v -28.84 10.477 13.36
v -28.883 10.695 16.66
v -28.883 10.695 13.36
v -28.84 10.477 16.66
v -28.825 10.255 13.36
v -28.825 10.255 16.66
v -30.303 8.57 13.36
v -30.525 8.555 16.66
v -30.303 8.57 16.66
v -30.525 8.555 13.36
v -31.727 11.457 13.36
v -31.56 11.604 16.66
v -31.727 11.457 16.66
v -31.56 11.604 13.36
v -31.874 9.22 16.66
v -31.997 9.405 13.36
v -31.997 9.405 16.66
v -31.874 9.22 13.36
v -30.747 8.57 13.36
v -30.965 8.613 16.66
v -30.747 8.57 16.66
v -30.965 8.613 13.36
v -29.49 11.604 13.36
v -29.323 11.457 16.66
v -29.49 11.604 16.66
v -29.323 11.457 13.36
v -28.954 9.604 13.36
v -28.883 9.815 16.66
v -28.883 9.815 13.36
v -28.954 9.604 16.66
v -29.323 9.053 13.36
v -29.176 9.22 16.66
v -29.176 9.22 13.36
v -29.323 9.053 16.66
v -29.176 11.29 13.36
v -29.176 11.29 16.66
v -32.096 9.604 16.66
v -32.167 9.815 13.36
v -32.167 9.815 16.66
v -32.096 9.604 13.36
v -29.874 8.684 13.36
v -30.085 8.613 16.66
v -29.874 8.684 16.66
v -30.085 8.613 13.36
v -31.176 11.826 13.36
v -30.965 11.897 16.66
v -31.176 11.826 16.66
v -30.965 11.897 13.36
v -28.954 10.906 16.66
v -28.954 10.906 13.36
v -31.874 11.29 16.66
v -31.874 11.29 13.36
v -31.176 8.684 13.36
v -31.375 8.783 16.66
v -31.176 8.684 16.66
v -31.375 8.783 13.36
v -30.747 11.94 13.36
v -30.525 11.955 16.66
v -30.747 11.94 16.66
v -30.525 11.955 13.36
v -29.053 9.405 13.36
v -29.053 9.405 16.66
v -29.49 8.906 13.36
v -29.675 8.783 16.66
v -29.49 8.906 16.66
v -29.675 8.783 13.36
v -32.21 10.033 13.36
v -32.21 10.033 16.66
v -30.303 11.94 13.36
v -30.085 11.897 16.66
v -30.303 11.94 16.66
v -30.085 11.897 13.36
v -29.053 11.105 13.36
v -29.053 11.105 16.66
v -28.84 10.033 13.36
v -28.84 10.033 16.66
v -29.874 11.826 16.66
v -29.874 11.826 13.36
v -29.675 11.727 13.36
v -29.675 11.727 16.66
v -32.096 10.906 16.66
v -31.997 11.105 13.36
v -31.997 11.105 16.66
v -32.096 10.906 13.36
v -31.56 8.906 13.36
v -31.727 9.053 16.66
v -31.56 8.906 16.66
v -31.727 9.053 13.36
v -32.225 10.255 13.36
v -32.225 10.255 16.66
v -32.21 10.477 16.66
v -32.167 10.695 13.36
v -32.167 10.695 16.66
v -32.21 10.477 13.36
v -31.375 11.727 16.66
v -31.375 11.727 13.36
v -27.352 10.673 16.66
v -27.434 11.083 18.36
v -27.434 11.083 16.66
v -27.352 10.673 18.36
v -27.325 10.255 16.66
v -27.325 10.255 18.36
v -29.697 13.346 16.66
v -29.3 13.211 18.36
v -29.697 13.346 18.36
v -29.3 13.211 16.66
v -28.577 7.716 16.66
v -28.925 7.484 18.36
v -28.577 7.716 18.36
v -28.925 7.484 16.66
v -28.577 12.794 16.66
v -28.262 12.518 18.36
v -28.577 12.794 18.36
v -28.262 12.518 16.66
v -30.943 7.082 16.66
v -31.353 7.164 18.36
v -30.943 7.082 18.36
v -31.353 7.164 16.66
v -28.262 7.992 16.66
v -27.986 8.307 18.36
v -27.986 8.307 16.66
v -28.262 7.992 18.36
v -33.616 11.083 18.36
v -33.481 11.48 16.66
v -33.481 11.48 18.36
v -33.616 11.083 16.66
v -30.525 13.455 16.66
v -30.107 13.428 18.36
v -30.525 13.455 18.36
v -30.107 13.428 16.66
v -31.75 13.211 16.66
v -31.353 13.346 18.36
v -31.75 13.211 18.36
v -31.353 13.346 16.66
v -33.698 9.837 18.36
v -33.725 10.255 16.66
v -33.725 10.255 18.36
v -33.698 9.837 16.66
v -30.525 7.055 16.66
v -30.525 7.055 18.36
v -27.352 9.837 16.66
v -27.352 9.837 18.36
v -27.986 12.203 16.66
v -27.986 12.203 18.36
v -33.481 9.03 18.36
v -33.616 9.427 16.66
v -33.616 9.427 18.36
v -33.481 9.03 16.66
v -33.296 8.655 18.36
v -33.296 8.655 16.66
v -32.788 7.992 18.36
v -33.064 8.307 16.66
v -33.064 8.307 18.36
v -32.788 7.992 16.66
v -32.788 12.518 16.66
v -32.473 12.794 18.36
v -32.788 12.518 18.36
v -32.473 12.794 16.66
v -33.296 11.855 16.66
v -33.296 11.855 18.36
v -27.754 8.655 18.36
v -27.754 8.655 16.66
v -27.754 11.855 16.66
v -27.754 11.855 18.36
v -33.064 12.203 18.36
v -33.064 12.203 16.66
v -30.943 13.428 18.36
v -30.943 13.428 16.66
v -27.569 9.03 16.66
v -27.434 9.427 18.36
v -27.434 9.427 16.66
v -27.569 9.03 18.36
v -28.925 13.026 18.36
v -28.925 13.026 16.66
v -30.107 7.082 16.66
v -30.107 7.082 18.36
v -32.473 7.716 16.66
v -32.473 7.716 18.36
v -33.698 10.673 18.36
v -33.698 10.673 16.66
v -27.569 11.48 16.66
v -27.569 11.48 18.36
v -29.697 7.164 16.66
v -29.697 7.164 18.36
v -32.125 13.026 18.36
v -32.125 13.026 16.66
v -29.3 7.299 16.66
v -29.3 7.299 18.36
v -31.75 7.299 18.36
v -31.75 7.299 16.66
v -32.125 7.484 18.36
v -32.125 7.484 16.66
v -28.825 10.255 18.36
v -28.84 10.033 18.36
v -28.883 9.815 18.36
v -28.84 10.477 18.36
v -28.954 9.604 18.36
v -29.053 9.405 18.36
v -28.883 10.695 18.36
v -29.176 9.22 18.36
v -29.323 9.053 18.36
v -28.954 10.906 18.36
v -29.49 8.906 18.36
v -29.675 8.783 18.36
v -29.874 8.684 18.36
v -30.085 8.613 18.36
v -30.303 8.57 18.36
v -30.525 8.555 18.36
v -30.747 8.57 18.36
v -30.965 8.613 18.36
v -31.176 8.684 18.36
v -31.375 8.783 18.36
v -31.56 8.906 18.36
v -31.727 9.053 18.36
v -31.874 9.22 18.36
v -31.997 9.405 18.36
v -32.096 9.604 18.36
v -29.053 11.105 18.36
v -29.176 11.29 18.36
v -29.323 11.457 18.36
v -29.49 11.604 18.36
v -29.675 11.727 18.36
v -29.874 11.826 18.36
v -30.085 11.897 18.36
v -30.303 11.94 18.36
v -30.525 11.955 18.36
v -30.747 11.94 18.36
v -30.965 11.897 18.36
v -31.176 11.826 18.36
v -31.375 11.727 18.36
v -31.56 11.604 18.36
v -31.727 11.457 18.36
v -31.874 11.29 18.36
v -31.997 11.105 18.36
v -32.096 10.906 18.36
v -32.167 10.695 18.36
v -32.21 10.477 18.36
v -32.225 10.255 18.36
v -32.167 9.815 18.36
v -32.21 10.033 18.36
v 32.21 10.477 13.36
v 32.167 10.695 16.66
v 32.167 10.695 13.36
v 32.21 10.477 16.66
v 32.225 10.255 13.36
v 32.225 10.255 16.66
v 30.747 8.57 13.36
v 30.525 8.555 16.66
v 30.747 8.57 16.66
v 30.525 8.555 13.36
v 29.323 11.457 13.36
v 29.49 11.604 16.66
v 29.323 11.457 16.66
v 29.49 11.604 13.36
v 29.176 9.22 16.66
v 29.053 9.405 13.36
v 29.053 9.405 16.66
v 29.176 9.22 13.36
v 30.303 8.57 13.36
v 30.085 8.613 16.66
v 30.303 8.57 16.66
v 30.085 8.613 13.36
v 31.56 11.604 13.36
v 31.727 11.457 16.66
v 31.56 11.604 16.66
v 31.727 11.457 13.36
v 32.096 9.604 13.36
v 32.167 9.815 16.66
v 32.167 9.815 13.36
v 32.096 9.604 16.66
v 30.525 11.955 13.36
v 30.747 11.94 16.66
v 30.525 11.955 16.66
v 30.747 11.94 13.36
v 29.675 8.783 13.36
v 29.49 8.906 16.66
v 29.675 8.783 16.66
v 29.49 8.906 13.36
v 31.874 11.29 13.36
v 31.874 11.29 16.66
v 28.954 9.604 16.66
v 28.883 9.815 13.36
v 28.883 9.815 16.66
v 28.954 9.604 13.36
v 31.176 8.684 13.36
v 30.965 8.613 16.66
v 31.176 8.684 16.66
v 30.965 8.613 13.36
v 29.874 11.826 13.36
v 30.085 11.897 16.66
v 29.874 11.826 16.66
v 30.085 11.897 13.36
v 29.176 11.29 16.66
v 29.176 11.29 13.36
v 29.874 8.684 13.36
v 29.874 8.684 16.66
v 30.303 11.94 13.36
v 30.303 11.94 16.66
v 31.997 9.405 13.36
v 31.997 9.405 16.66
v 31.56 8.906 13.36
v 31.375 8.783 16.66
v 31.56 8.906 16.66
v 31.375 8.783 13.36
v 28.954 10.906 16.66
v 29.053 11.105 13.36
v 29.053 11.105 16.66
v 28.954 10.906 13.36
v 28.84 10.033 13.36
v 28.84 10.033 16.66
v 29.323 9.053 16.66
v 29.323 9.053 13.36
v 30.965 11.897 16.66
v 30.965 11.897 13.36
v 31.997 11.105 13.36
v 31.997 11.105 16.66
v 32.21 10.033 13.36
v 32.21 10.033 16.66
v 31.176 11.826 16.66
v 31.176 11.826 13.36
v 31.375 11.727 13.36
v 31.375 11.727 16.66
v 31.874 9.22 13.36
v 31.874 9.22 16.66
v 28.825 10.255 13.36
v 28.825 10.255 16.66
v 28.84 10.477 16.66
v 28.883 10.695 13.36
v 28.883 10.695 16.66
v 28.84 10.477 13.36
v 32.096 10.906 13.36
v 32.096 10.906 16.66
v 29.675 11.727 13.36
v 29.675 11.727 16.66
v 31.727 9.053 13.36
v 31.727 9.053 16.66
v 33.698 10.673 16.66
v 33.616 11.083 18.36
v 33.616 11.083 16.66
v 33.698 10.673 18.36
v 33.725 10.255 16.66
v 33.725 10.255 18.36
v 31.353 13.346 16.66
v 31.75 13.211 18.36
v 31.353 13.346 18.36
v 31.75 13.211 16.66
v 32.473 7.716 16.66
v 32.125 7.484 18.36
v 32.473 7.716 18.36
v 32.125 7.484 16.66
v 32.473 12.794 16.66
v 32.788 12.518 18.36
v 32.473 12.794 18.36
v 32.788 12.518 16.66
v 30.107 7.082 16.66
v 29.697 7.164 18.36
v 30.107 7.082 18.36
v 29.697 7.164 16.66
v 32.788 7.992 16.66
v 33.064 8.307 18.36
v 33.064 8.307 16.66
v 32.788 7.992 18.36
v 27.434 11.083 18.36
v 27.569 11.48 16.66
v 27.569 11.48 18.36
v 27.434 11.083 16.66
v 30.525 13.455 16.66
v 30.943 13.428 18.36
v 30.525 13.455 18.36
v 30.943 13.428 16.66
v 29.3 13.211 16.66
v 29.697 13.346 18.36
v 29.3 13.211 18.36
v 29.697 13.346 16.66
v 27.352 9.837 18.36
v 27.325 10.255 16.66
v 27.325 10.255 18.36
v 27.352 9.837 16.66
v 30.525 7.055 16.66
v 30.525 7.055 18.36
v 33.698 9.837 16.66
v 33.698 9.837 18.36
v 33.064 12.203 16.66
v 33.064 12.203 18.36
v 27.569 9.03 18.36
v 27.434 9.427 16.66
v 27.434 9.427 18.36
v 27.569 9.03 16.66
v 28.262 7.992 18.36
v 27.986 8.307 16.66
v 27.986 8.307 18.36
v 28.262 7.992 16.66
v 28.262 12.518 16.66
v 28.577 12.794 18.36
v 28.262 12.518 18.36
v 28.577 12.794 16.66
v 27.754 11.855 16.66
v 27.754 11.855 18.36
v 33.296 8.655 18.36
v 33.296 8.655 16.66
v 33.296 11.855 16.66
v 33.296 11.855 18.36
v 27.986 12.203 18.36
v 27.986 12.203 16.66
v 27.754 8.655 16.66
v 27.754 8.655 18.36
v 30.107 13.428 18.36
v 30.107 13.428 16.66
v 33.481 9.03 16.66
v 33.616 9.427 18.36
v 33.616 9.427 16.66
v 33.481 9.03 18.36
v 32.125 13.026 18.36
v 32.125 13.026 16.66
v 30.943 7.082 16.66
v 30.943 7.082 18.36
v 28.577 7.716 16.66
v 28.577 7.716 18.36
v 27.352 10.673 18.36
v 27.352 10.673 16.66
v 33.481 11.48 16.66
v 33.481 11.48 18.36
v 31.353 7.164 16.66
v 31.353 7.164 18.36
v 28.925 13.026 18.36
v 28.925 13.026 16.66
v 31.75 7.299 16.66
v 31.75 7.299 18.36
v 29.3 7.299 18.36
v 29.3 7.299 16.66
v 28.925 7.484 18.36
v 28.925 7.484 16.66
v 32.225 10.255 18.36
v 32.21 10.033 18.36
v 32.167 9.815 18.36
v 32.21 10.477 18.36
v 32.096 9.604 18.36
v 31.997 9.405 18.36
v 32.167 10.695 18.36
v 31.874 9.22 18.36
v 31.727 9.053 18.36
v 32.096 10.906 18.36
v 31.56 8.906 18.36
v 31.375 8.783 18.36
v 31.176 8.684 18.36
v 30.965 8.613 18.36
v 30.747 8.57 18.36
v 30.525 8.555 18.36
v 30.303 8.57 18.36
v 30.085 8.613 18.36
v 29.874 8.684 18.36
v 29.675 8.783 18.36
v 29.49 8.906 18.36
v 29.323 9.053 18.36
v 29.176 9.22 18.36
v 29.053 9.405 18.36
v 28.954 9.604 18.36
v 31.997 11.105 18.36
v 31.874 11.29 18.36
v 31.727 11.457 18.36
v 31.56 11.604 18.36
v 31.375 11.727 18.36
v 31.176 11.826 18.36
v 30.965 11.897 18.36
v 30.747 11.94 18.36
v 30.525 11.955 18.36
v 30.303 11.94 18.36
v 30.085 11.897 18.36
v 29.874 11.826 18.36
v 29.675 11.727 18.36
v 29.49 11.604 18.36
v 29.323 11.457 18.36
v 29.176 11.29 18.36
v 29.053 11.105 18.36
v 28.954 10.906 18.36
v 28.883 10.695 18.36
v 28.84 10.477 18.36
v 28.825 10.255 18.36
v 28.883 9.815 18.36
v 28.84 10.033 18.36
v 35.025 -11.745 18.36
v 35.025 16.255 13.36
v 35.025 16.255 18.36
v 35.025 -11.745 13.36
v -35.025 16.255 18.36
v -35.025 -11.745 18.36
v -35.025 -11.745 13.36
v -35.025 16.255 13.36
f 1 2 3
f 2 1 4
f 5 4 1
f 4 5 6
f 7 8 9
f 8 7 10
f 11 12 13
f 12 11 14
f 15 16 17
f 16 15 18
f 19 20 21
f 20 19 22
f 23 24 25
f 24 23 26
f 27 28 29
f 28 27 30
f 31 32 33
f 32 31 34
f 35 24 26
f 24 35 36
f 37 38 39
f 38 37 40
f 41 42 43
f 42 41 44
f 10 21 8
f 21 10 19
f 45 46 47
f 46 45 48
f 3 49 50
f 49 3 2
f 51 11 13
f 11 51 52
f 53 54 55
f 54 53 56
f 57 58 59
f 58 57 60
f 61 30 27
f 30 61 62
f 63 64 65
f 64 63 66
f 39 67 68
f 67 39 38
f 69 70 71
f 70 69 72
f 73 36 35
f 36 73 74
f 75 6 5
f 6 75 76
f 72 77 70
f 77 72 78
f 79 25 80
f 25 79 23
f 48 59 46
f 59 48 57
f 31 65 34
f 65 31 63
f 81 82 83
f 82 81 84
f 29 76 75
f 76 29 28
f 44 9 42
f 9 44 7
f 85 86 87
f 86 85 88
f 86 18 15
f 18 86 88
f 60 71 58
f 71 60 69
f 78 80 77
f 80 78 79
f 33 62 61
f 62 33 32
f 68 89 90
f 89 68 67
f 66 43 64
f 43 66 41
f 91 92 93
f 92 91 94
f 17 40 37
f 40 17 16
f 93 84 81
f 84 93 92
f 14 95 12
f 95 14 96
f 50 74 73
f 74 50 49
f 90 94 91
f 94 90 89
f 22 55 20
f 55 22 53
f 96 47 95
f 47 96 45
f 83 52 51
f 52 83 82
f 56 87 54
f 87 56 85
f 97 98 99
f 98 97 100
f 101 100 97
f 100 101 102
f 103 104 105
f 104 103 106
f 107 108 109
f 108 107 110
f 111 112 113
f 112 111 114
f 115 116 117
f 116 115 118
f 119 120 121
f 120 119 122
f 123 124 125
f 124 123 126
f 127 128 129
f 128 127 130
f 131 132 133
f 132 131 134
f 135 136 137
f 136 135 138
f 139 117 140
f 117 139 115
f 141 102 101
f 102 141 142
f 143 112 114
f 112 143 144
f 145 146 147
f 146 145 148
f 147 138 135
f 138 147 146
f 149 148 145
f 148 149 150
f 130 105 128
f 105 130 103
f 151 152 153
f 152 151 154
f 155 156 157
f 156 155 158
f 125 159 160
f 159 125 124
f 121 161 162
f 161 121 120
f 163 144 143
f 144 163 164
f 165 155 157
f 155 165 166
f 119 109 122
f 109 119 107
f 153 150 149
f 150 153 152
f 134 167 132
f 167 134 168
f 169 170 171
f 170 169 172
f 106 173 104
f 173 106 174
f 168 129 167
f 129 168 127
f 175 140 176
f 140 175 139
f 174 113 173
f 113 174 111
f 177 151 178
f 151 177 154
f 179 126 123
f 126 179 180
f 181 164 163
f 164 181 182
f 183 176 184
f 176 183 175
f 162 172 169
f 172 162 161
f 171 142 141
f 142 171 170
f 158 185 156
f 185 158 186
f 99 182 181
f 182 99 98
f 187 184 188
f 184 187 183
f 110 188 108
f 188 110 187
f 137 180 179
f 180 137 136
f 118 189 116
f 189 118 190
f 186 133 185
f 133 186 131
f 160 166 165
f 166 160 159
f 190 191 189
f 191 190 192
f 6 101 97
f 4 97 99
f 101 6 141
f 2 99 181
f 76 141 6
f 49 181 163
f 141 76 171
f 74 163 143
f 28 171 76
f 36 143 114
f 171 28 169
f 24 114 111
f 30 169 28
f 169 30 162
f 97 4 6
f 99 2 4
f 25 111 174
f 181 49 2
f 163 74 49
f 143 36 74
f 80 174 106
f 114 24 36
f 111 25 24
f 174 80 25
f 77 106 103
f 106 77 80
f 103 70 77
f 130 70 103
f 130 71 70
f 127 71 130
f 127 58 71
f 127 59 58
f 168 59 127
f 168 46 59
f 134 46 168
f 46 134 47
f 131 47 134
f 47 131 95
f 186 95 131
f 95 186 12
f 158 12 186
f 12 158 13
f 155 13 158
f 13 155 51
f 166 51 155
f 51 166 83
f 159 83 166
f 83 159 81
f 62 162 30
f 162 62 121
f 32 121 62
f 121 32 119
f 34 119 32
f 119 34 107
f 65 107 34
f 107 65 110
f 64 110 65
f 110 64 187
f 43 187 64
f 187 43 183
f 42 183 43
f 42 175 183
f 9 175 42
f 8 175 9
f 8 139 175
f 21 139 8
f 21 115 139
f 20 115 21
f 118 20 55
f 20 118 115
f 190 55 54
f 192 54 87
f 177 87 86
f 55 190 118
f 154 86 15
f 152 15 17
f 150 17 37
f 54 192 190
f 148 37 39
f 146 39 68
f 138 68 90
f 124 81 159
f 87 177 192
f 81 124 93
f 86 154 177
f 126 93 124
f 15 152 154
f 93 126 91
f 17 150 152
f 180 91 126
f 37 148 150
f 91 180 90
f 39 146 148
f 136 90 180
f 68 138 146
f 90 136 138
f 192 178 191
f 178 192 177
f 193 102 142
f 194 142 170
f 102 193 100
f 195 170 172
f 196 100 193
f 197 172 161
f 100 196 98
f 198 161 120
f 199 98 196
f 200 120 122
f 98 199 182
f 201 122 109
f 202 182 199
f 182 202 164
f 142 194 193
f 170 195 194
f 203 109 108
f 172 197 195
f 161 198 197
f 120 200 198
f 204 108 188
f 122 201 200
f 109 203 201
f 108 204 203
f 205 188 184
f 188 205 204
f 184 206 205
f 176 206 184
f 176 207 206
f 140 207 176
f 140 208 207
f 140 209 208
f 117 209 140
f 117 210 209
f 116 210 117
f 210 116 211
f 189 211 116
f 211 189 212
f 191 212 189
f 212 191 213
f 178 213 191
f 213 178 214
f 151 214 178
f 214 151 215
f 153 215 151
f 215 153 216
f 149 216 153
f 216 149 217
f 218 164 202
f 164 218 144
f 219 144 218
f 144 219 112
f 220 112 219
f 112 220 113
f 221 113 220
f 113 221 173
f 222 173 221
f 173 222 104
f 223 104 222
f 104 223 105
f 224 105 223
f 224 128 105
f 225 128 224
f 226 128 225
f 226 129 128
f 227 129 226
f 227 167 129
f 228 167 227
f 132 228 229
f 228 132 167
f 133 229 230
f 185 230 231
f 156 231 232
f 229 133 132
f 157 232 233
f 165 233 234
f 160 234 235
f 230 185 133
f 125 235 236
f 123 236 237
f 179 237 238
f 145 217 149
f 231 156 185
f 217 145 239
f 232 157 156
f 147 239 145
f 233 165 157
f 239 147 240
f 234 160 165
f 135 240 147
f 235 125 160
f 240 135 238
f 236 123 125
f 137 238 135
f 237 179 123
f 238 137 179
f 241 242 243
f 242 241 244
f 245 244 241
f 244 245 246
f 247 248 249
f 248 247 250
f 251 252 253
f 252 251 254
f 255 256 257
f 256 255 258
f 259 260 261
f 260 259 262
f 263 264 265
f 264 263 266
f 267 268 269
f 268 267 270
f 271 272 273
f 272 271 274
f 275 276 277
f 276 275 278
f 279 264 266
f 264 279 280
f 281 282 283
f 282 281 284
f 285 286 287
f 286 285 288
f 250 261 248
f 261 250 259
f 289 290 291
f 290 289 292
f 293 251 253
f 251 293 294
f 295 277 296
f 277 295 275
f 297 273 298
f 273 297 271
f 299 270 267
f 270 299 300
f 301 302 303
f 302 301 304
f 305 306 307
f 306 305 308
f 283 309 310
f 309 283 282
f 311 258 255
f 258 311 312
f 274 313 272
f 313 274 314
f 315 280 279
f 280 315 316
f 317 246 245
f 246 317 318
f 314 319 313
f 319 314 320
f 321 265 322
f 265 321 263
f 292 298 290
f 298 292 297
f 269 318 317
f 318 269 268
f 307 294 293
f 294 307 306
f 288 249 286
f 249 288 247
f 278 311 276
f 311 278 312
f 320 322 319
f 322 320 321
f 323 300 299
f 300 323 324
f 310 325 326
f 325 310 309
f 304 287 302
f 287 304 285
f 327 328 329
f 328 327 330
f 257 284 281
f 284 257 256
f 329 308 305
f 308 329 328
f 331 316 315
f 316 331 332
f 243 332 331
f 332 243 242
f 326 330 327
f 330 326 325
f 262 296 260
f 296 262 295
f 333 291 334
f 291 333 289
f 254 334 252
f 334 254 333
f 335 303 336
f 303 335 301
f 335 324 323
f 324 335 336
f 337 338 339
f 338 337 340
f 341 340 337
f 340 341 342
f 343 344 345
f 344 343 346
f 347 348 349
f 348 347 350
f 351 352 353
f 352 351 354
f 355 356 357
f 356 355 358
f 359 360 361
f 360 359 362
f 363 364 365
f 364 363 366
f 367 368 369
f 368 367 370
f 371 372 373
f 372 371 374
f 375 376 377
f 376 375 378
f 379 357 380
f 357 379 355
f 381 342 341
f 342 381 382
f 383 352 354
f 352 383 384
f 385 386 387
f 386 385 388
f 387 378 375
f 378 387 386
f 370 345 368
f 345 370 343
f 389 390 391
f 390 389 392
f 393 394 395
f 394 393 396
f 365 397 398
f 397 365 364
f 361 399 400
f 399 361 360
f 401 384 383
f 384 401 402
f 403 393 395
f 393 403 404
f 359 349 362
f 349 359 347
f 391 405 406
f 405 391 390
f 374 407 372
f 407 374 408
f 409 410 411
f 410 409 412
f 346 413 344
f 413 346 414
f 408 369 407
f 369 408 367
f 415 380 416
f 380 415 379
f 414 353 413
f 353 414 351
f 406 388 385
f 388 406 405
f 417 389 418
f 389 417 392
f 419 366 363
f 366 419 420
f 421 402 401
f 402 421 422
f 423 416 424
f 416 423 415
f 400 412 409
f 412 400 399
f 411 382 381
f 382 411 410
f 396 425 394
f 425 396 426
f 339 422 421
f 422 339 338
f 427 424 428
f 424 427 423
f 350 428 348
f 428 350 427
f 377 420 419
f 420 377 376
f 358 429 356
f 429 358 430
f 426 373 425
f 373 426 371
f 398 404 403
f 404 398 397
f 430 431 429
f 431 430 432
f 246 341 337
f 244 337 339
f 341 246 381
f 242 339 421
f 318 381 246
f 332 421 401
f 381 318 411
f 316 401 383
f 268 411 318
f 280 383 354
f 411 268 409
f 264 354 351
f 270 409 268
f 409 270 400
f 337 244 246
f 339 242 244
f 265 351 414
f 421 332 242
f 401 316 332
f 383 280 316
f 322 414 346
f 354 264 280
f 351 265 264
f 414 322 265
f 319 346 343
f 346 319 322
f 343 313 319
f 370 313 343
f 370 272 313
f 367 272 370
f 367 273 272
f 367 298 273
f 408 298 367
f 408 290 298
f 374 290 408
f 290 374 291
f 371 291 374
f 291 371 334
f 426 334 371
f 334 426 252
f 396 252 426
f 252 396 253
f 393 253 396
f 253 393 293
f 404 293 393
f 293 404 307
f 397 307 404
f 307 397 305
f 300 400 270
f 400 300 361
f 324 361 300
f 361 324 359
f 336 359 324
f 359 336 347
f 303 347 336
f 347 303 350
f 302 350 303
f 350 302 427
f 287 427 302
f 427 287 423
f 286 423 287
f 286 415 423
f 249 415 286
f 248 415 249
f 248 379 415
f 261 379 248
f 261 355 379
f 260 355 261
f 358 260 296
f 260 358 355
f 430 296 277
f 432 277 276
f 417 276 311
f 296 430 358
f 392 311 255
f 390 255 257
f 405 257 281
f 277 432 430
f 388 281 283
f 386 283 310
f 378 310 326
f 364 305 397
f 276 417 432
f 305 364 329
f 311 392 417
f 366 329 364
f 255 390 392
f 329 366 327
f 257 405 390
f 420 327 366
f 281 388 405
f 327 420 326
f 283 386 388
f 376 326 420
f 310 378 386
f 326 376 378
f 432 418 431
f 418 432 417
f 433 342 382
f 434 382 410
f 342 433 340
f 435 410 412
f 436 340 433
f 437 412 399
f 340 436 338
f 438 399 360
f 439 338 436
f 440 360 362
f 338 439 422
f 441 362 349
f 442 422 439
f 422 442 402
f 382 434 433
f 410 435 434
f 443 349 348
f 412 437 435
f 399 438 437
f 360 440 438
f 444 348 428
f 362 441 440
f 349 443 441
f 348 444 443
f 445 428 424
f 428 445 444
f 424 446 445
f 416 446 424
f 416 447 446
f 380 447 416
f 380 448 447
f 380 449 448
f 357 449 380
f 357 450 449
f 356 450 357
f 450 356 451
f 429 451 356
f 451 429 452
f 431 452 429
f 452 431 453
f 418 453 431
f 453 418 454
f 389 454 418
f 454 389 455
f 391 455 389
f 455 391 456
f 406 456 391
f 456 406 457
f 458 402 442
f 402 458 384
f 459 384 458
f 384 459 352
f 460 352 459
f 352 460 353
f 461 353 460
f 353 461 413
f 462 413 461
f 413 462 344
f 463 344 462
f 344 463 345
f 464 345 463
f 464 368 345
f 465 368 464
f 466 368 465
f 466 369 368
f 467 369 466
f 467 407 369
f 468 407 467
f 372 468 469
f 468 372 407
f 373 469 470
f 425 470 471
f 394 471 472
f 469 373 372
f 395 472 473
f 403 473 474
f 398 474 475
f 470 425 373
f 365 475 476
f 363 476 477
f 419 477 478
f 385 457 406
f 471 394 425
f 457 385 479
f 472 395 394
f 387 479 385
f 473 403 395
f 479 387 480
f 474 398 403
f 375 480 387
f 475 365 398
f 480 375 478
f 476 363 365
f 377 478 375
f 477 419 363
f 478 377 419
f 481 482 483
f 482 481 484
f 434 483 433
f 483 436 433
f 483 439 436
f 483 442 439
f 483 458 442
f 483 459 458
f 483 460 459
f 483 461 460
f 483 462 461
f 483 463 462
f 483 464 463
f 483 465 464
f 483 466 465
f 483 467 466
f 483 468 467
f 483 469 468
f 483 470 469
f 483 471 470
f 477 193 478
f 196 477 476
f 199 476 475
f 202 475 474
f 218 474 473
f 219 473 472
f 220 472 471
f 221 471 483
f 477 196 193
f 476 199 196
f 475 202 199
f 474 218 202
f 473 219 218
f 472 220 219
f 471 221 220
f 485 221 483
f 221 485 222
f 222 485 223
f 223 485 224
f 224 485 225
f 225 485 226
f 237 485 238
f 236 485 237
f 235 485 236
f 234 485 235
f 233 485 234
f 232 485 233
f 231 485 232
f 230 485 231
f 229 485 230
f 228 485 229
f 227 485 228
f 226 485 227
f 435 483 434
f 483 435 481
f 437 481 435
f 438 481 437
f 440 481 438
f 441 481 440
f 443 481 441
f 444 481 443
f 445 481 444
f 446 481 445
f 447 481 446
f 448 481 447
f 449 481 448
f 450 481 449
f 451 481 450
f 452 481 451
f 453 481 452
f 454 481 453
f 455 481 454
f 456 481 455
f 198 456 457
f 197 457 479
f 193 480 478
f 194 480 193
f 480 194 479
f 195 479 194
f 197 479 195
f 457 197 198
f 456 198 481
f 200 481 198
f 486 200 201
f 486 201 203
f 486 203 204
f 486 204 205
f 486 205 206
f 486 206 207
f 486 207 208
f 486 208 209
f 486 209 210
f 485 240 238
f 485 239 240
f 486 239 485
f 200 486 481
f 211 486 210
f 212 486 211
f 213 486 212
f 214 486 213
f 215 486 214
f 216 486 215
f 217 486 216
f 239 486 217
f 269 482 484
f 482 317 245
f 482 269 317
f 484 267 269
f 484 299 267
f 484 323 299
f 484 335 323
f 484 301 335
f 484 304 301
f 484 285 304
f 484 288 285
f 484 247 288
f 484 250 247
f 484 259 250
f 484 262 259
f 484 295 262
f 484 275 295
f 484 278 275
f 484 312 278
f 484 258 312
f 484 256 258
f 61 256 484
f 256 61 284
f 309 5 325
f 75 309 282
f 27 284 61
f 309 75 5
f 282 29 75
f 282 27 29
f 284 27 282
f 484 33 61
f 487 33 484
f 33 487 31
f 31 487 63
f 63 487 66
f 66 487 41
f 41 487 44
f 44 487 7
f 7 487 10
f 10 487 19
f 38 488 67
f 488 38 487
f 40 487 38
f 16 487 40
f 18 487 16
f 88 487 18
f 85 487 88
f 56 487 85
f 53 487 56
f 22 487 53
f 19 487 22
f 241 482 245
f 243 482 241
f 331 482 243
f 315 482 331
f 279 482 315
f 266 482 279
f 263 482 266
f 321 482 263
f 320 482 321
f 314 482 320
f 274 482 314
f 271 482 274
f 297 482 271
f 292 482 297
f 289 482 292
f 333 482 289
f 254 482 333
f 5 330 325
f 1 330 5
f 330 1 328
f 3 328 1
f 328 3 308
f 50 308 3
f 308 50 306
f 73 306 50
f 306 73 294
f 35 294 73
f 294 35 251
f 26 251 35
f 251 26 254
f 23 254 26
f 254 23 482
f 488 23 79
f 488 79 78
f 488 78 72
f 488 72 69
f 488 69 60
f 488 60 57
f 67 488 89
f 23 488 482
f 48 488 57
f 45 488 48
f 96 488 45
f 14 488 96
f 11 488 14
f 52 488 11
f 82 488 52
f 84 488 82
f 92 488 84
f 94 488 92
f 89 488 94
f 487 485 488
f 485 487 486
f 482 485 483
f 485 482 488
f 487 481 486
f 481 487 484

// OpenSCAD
// file: thermal_cam_mount_common.scad
// thermal_cam_mount_common.scad — sandwich clamp holding a Sipeed T256s thermal
// camera on the LED-56S ring light's control-box tab, for the benchhud HUD.
//
// WHY: the T256s is registered onto the scope's visible feed so a hot component's
// bloom labels that component. The registration transform is computed once and
// must HOLD every session → rigid, non-drifting, fixed-angle mount.
//
// TAB (control box, measured 2026-07-23): 49.65 W (X) × 32.51 front-to-back (Y)
// × 26.42 thick (Z). The tab is a BOSS on top of the ring, so five of its faces
// are unusable: REAR merges into the ring, FRONT has the brightness wheel, the
// two SIDES have the switch and the jack, and the BOTTOM has a center screw.
// Only the TOP (scope-facing) face is fully clear.
//
// SANDWICH: a TOP plate and a BOTTOM plate grip the tab's top and bottom faces
// over the front ~28 mm; two screws at the FRONT CORNERS pass outboard of the
// tab (clear of the mid-side switch/jack, either side of the front wheel) and
// draw the plates together. No rear wall (misses the ring), no side walls (miss
// the controls). The bottom plate has a pocket for the center screw and carries
// the cam cradle. Long top+bottom grip = the moment arm that resists nose-down
// tilt from the cam's weight. TWO printed parts: mount_top + mount_bottom.
//
//   ⚠ First-print fit checks: FIT (plate-to-tab gap) and the front-corner screw
//     clearance. Confirm the top face is rigid ABS before trusting the grip.

$fn = 48;
EPS = 0.1;

// ---- tab (measured) ----
TAB_W  = 49.65;   // X width
TAB_FB = 32.51;   // Y front-to-back (front = +Y, away from ring)
TAB_T  = 26.42;   // Z thickness (top = +Z)
FIT    = 0.3;     // gap between each plate and the tab face

// ---- plates / fasteners ----
PLATE_T   = 5;    // each plate thickness
GRIP_LEN  = 28;   // how far back from the front the plates cover (of 32.51 → 4.5 rear clear)
BOSS_GAP  = 1.2;  // clearance from the tab side to the screw boss
BOSS_R    = 4.5;  // front-corner boss radius (M3 heat-set insert)
BOSS_INSET_Y = 6; // boss centre back from the front edge
INSERT_D  = 4.6;  // M3 heat-set insert bore (bottom-plate bosses)
SCREW_D   = 3.4;  // M3 clearance (top plate)
SCREW_CB  = 6.4;  // counterbore for the screw head
CENTER_POCKET_D = 13;   // clearance pocket over the tab's bottom center screw
CENTER_POCKET_H = 3.5;

// ---- Sipeed T256s (LOCKED) ----
CAM_W = 42; CAM_H = 35; CAM_D = 14;
CAM_CLR   = 0.6;
CAM_ANGLE = 30;   // tilt from vertical → lens looks down at the board

// ---- cradle ----
LIP=4.5; SIDE_H=16; CORNER=6; CABLE_W=12; WALL=3; ARM_DROP=7;
CABLE_DIR = "down";   // "down" (female/bottom port) | "side" (right-angle adapter)

// ============================================================================
// derived
half    = TAB_T/2 + FIT/2;                 // inner half-gap (plate face to centre)
y_front = TAB_FB/2;
y_back  = y_front - GRIP_LEN;
PW      = 2*(TAB_W/2 + BOSS_GAP + 2*BOSS_R);   // plate width (spans to the bosses)
boss_x  = TAB_W/2 + BOSS_GAP + BOSS_R;
boss_y  = y_front - BOSS_INSET_Y;
bot_z0  = -half - PLATE_T;                  // underside of the bottom plate

module _plate() {                            // flat footprint in X-Y, unit thickness at z=0
    translate([-PW/2, y_back, 0]) cube([PW, GRIP_LEN, PLATE_T]);
}

// Open cradle (upright frame, pre-tilt) — grips the cam bottom edge, both sides,
// top-front corners; lens (front) and most of the screen (back) stay open.
module _cradle() {
    iw = CAM_W + CAM_CLR; id = CAM_D + CAM_CLR;
    ow = iw + 2*WALL; oy = id + 2*WALL;
    difference() {
        union() {
            translate([-ow/2, 0, 0]) cube([ow, oy, LIP]);
            translate([-ow/2, 0, 0]) cube([WALL, oy, SIDE_H]);
            translate([ iw/2, 0, 0]) cube([WALL, oy, SIDE_H]);
            translate([-ow/2, oy - WALL, 0]) cube([ow, WALL, SIDE_H + WALL]);
            for (sx = [-ow/2, iw/2 - CORNER])
                translate([sx, 0, SIDE_H - EPS]) cube([WALL + CORNER, WALL + 2, WALL + EPS]);
        }
        translate([-iw/2, WALL, LIP]) cube([iw, id, CAM_H + CAM_CLR + 10]);
        if (CABLE_DIR == "down")
            translate([-CABLE_W/2, -EPS, -EPS]) cube([CABLE_W, oy + 2*EPS, LIP + 2*EPS]);
        else
            translate([-ow/2 - EPS, oy/2 - CABLE_W/2, -EPS]) cube([ow + 2*EPS, CABLE_W, LIP + 2*EPS]);
    }
}

// ---- part 1: bottom plate + bosses + cradle ----
module mount_bottom() {
    union() {
        difference() {
            union() {
                translate([0,0,bot_z0]) _plate();                         // plate
                for (sx = [-boss_x, boss_x])                              // front-corner bosses
                    translate([sx, boss_y, -half]) cylinder(r = BOSS_R, h = 2*half);
            }
            // heat-set inserts down into the bosses from the top
            for (sx = [-boss_x, boss_x])
                translate([sx, boss_y, half - 8]) cylinder(d = INSERT_D, h = 8 + EPS);
            // clearance pocket over the tab's bottom center screw
            translate([0, 0, -half - CENTER_POCKET_H])
                cylinder(d = CENTER_POCKET_D, h = CENTER_POCKET_H + EPS);
        }
        // arm from the plate underside down to the tilted cradle at the front
        aw = CAM_W + 2*WALL;
        translate([-aw/2, y_front - WALL, bot_z0 - ARM_DROP])
            cube([aw, WALL + 2, ARM_DROP + PLATE_T + EPS]);
        translate([0, y_front + EPS, bot_z0 - ARM_DROP])
            rotate([-(90 - CAM_ANGLE), 0, 0]) _cradle();
    }
}

// ---- part 2: top plate ----
module mount_top() {
    difference() {
        translate([0,0,half]) _plate();
        for (sx = [-boss_x, boss_x]) translate([sx, boss_y, half - EPS]) {
            cylinder(d = SCREW_D, h = PLATE_T + 2*EPS);
            translate([0,0,PLATE_T - 1.6]) cylinder(d = SCREW_CB, h = 1.6 + EPS);
        }
    }
}
// main file
// mount_top — top plate with 2 front-corner screw holes. Print flat.
include <thermal_cam_mount_common.scad>
mount_top();
